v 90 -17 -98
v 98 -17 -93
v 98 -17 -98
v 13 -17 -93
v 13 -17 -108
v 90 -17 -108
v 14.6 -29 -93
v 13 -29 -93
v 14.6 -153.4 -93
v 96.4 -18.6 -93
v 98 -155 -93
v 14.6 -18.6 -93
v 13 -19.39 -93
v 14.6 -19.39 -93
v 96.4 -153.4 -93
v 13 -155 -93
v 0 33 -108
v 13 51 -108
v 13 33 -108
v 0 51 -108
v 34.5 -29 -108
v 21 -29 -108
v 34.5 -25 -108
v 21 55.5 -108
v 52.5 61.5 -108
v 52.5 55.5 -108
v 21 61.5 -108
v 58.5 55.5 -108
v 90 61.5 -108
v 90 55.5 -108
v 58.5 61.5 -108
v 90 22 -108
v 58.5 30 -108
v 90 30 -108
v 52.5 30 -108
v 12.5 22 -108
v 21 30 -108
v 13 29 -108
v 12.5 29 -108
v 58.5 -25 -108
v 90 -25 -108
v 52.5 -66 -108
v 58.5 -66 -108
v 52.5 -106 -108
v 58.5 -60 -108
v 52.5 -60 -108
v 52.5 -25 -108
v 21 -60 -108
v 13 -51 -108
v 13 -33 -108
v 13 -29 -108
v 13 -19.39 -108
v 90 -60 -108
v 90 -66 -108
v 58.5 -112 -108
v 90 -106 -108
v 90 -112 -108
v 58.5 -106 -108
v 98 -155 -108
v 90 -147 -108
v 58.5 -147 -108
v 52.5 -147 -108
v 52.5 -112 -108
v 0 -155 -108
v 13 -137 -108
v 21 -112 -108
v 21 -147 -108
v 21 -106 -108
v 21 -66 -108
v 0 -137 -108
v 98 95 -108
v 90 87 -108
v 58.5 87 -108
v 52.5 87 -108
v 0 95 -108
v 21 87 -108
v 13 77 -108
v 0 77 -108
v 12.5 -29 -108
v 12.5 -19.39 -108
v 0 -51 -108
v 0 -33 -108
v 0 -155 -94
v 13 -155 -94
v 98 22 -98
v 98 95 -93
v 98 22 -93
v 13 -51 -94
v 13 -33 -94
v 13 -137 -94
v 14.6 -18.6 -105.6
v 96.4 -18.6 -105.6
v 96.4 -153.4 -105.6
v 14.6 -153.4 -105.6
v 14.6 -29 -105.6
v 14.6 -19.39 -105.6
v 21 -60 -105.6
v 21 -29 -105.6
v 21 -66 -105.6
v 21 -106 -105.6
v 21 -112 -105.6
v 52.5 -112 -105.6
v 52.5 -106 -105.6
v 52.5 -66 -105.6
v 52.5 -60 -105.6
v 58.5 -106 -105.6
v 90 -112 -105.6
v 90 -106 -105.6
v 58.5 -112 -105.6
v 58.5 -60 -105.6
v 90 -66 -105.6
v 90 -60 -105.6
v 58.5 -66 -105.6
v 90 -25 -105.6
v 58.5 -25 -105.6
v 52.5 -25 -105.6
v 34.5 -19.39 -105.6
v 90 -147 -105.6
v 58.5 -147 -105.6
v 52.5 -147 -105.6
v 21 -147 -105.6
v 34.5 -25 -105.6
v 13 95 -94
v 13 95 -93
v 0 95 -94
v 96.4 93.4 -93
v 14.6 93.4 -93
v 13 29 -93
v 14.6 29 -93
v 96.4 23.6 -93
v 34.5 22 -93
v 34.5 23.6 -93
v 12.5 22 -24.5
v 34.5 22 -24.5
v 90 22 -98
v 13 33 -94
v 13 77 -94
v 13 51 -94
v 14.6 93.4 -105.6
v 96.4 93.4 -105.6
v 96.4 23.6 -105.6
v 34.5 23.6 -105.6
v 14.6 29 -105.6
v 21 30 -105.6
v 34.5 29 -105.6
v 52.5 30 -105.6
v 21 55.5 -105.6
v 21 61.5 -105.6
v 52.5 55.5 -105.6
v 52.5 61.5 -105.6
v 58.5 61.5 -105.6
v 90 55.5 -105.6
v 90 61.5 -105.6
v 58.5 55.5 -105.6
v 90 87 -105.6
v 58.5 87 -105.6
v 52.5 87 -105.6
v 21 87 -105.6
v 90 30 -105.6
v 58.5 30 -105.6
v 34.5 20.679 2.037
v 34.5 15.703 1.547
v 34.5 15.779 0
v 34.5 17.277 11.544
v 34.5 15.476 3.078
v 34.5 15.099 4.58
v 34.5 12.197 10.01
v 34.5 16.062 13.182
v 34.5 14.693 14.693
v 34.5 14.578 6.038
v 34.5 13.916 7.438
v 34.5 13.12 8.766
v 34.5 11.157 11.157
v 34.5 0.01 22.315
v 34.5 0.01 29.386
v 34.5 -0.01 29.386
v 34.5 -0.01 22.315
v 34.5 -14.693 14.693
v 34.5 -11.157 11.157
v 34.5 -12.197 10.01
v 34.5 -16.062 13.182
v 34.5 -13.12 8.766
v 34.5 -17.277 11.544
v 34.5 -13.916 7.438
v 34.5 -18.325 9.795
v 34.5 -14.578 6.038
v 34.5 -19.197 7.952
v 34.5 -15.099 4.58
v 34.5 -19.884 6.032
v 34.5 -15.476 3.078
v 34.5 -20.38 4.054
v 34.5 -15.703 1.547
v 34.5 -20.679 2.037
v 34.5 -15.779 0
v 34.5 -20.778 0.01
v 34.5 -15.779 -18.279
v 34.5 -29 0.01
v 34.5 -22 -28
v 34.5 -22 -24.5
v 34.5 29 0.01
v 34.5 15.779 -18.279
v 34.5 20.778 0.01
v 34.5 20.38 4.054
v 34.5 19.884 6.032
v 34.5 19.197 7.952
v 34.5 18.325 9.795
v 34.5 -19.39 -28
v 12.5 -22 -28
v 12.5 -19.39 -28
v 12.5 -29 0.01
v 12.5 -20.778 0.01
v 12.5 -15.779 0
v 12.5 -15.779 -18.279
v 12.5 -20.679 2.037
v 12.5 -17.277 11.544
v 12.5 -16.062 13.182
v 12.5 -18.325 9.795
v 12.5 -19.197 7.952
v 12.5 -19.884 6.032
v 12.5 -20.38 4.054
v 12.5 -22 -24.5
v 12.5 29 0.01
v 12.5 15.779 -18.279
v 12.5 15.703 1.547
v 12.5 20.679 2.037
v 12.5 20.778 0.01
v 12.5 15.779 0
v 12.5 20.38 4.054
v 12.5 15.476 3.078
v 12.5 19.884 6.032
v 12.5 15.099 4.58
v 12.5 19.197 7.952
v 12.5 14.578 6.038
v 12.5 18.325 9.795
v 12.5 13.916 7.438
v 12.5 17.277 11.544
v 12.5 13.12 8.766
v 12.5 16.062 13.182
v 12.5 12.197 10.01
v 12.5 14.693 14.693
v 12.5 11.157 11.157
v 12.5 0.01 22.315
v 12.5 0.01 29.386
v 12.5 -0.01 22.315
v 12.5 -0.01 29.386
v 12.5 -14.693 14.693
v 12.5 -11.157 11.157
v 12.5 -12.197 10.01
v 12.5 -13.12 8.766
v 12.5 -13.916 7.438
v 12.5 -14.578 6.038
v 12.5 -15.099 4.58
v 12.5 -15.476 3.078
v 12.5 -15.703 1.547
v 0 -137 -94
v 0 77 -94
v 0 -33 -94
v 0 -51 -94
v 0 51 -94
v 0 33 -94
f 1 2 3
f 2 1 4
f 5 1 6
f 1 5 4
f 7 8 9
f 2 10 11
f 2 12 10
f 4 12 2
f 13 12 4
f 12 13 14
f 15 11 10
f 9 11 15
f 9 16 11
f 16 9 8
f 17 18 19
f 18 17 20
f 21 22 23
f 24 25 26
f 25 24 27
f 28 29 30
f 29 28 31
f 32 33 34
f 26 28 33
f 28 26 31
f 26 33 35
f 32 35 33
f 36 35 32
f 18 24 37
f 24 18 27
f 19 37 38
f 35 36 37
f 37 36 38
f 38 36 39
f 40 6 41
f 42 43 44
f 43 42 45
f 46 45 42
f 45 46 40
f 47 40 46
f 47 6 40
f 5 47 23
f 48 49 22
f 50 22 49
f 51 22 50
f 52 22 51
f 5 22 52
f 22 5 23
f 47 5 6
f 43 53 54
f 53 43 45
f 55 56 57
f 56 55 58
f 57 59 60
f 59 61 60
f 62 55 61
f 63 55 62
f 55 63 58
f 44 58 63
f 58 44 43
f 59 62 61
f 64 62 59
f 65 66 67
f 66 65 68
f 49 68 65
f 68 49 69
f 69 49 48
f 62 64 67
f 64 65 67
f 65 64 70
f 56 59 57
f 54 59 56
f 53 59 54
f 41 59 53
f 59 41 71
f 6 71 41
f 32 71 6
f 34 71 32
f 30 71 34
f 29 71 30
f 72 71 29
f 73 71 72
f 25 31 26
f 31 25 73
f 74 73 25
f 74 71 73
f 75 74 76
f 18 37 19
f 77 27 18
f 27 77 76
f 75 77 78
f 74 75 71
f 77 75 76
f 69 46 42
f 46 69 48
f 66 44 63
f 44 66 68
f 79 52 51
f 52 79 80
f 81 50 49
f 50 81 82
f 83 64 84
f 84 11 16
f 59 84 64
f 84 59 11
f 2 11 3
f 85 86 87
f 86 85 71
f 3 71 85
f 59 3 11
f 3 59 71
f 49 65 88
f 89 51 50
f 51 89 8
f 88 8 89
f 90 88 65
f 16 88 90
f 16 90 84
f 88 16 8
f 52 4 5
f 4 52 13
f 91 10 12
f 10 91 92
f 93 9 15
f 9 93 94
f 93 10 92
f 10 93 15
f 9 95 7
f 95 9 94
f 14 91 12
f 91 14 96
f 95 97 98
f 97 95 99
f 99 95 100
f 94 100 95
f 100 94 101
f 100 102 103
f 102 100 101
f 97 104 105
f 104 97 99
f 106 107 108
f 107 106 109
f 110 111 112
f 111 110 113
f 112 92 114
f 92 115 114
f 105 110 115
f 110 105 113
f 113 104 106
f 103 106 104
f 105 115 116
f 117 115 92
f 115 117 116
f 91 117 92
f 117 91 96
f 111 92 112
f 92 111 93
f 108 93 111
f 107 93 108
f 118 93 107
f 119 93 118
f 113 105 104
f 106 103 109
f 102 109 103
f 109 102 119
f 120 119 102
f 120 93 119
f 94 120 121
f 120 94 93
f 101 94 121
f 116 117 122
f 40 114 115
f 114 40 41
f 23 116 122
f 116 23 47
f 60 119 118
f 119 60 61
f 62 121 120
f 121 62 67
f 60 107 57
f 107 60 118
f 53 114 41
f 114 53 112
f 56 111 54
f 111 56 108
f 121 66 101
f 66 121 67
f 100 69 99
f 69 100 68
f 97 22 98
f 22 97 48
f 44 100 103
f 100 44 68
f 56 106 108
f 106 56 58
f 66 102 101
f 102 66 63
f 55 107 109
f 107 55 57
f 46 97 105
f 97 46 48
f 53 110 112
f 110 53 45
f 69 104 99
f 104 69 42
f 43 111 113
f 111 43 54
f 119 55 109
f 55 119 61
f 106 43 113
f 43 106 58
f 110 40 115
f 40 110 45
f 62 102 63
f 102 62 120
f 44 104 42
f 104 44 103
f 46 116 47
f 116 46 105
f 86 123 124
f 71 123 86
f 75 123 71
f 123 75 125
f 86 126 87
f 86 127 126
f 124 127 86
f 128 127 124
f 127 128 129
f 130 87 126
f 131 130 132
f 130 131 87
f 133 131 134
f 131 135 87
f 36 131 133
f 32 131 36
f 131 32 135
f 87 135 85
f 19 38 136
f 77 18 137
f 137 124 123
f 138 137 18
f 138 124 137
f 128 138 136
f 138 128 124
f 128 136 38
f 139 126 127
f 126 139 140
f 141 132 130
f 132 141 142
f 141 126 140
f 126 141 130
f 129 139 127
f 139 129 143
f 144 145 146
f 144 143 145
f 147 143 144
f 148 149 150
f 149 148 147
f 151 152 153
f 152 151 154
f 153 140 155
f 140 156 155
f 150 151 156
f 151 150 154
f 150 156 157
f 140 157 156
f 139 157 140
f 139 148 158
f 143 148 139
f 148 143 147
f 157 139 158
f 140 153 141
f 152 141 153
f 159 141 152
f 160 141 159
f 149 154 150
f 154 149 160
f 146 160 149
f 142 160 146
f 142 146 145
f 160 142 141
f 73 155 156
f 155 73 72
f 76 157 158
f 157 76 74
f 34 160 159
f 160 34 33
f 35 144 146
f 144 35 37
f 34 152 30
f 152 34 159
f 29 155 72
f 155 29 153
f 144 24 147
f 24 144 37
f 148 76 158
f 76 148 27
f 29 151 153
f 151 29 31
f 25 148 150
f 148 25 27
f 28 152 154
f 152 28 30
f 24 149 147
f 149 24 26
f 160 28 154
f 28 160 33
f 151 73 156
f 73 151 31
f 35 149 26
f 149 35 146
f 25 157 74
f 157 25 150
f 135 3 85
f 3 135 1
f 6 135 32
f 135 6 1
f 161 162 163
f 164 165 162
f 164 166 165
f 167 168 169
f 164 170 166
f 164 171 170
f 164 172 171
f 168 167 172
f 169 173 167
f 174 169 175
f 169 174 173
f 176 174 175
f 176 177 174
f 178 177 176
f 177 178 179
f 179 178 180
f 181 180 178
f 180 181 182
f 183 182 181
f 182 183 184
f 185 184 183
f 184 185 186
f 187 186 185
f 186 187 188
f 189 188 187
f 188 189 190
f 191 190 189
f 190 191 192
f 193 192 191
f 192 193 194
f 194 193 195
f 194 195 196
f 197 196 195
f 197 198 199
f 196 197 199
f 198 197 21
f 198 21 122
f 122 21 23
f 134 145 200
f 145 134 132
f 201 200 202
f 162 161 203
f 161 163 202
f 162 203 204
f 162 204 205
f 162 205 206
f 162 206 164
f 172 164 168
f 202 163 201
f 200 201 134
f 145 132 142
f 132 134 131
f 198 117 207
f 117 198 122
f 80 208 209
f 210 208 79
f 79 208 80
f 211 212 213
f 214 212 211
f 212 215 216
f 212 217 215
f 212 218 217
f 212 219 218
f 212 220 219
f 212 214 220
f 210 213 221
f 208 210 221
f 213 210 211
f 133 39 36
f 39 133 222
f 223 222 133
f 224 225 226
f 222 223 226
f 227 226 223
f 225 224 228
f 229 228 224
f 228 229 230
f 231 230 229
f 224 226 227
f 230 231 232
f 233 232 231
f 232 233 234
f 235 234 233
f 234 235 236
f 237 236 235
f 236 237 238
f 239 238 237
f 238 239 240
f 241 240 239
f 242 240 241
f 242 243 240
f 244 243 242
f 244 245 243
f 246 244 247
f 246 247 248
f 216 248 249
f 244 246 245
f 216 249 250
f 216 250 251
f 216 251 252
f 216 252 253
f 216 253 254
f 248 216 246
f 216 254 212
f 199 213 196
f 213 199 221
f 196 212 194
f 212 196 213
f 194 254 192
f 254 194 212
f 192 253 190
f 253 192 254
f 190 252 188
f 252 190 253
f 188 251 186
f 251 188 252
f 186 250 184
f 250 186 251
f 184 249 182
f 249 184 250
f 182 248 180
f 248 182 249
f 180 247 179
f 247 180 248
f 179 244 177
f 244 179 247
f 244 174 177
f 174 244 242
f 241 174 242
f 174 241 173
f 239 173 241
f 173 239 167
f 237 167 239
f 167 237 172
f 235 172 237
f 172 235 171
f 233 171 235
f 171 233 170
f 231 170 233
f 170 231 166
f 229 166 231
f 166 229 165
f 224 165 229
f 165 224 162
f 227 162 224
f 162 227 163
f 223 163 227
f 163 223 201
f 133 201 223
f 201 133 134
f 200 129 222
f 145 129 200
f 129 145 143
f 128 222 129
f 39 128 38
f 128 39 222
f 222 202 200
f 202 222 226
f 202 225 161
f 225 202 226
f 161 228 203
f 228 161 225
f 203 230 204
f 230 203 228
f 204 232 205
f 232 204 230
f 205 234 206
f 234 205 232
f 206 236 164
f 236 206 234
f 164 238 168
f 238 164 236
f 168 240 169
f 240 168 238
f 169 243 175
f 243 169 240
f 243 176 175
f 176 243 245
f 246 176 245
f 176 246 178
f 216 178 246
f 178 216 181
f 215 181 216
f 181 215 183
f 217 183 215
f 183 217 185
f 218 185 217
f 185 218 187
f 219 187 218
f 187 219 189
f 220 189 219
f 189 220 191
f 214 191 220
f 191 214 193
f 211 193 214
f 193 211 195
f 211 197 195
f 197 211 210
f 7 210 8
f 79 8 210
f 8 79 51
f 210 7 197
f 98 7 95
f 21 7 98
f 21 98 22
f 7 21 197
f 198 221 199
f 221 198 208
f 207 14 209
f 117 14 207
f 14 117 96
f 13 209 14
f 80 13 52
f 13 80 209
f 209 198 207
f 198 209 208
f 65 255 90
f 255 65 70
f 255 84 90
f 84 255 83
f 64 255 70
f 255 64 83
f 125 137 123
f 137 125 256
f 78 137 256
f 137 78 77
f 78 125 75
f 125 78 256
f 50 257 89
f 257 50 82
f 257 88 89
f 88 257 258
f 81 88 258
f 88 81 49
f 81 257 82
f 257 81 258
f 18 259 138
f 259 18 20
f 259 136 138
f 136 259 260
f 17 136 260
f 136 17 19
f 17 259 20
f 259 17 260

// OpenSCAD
// =====================================================================
//  PORTASHAMPOO PER RACCORDO DOCCINO  —  v3 (29/10/2026)
//  Parametrico: modifica le misure qui sotto e riesporta lo STL
//  (OpenSCAD: F6 = render, poi File > Export > STL).
//
//  Sistema di riferimento (stando nella doccia, guardando la parete):
//    X = orizzontale lungo il muro (+ verso l'angolo a destra)
//    Y = uscente dal muro verso di te (muro a Y = 0)
//    Z = verticale; l'asse del raccordo è a X = 0, Z = 0
//
//  Novità v2: sotto al raccordo pendono DUE flessibili (attacco vicino alla
//  rosetta + tubo che risale nel porta-doccino), il doccino sta in piedi sulla
//  punta. Il box lascia libero il centro e si cala dall'alto SENZA togliere
//  il doccino.
//
//  Novità v3 (dopo la prova del prototipo veloce):
//   - vano sinistro più grande di 5 mm per lato (largo +10, profondo +10)
//   - piedini posteriori 3 mm più lunghi verso le piastrelle
//   - lato destro più largo di 16 mm: arriva alla parete laterale
//   - DISTANZIATORE in basso davanti: i due vani non si avvicinano più
//     e l'arco non si flette (vedi simulazione nel LEGGIMI)
//   - "stampa_..." = pezzo già ruotato di 90° per entrare nel piatto
// =====================================================================

// ---------- QUALE PEZZO GENERARE ----------
// "stampa_rapido"   = prototipo veloce v3, GIÀ RUOTATO per il piatto (da usare in Cura)
// "stampa_bisaccia" = versione completa v3, GIÀ RUOTATA per il piatto (da usare in Cura)
// "rapido" / "bisaccia" = stessi pezzi orientati come in doccia (per guardarli)
// "scena_rapido" / "scena_bisaccia" = anteprima con muri, raccordo, flessibili e doccino
design = "stampa_rapido";

// ---------- MISURE DEL BAGNO ----------
tubo_d        = 96 / PI; // corpo del raccordo: circonferenza 96 mm -> Ø 30,6 (correggi dopo il provino)
rosetta_d     = 60;      // diametro rosetta (stima)
rosetta_sp    = 11;      // spessore rosetta dal muro (v3: dalla prova i piedini restavano a 3 mm dal muro)
// misure prese dalla faccia della rosetta, lungo il raccordo:
att_da        = 16;      // 1° tubo (attacco acqua, sotto al raccordo): da 16 ...
att_a         = 26;      // ... a 26 mm
doc_da        = 52;      // 2° tubo (flessibile che entra nel porta-doccino): da 52 ...
doc_a         = 66;      // ... a 66 mm
tubo_fine     = 72;      // fine del raccordo dalla rosetta (stima)
doccino_d     = 24;      // diametro del doccino (stima)
angolo_x      = 96;      // asse raccordo -> parete laterale destra (v3: dalla prova mancavano 16 mm)
miscelatore_x = -188;    // bordo del miscelatore a sinistra (stima da scan)

// ---------- GANCIO ----------
gioco         = 0.5;     // gioco radiale tra gancio e raccordo
anello_y0     = rosetta_sp + 1.5;   // il gancio parte subito davanti alla rosetta
anello_l      = 22;      // lunghezza del gancio sopra al raccordo (resta prima del doccino)
anello_sp     = 5;       // spessore radiale del gancio
avvolgimento  = 180;     // gradi di avvolgimento sopra al raccordo (180 = arco fino a metà raccordo)
arco_goccia   = true;    // arco a goccia: stampabile in piedi senza supporti

// ---------- BOX ----------
parete        = 2.4;     // pareti (6 perimetri da 0,4)
fondo         = 2.4;
box_y0        = rosetta_sp + 2;  // faccia posteriore del box (davanti alla rosetta)
box_prof      = 85;      // profondità esterna (v3: +10)
box_top       = -28;     // bordo posteriore (sotto al raccordo)
box_h         = 80;      // altezza sul retro
box_calo      = 25;      // il bordo anteriore è più basso di così
box_sx        = -155;    // estremo sinistro (v3: vano sinistro +5 mm a sinistra)
varco         = 22;      // varco centrale: lato destro a 22 mm dall'asse
varco_sx      = 17;      // lato sinistro a 17 mm (v3: vano sinistro +5 mm verso il centro)
// distanziatore tra i due vani, in basso davanti a flessibili e doccino
dist_h        = 10;      // altezza
dist_p        = 8;       // profondità
asola_l       = 4;       // asole di scarico nel fondo
asola_passo   = 10;
piede_l       = 18;      // piedini che appoggiano sulle piastrelle
piede_h       = 14;

$fn = 64;

// ---------- valori derivati ----------
R      = tubo_d / 2;
ri     = R + gioco;
ro     = ri + anello_sp;
ay1    = anello_y0 + anello_l;
zb     = box_top - box_h;
by1    = box_y0 + box_prof;
box_dx = angolo_x - 1;               // 1 mm dalla parete laterale
piede_in = rosetta_d / 2 + 3;        // piedini interni fuori dalla rosetta (montaggio dall'alto)
y_att  = rosetta_sp + (att_da + att_a) / 2;
y_doc  = rosetta_sp + (doc_da + doc_a) / 2;

// =====================================================================
//  GANCIO: arco sopra al raccordo + due montanti verso il box
// =====================================================================
// profilo "a goccia": sopra al raccordo le superfici non superano i 45° di sbalzo,
// così l'arco si stampa in piedi SENZA supporti e senza colature dove appoggia.
module goccia(r) {
    if (arco_goccia) hull() { circle(r = r); translate([0, r * sqrt(2) - 0.01]) square(0.02, center = true); }
    else circle(r = r);
}
module profilo_anello() {
    big = ro * 3;
    difference() {
        goccia(ro);
        goccia(ri);
        polygon(concat([[0, 0]],
            [for (a = [avvolgimento / 2 : 5 : 360 - avvolgimento / 2]) [big * sin(a), big * cos(a)]],
            [[big * sin(360 - avvolgimento / 2), big * cos(360 - avvolgimento / 2)]]));
    }
}

// montante: accanto al raccordo sta fuori dal tubo (x >= ri), sotto si sposta fino a x_in
// con uno smusso a 45° (nessun gradino orizzontale sospeso)
module profilo_montante(lato, z_fine, x_in) {
    xo = max(ro + 2, x_in + 7);
    zs = -R - 3;                    // sotto questa quota il montante può rientrare verso il centro
    mirror([lato < 0 ? 1 : 0, 0])
    polygon([[x_in, z_fine], [xo, z_fine], [xo, 0.01], [ri, 0.01], [ri, zs], [x_in, zs - (x_in - ri)]]);
}

module gancio(z_sx, z_dx, x_in_sx, x_in_dx) {
    translate([0, ay1, 0]) rotate([90, 0, 0])
    linear_extrude(anello_l)
    union() {
        profilo_anello();
        profilo_montante(-1, z_sx, x_in_sx);
        profilo_montante( 1, z_dx, x_in_dx);
    }
}

// =====================================================================
//  VANO: scatola aperta, bordo anteriore ribassato, fondo con asole
// =====================================================================
module taglio_bordo(x0, x1) {
    ang = atan(box_calo / (by1 - box_y0));
    translate([x0 - 1, box_y0, box_top]) rotate([-ang, 0, 0])
        translate([0, -50, 0]) cube([x1 - x0 + 2, 300, 200]);
}

module asole(x0, x1, y0, y1) {
    for (x = [x0 + parete + 5 : asola_passo : x1 - parete - 5])
        translate([x, y0 + parete + 6, zb - 1]) cube([asola_l, y1 - y0 - 2 * parete - 12, fondo + 2]);
}

module vano(x0, x1) {
    difference() {
        translate([x0, box_y0, zb]) cube([x1 - x0, by1 - box_y0, box_h]);
        translate([x0 + parete, box_y0 + parete, zb + fondo])
            cube([x1 - x0 - 2 * parete, by1 - box_y0 - 2 * parete, box_h]);
        taglio_bordo(x0, x1);
        asole(x0, x1, box_y0, by1);
    }
}

// versione "telaio" per la prova veloce: cornice + traversine + bordino basso
lab_h = 15;     // altezza del bordino
lab_s = 1.6;    // spessore del bordino
module vano_rapido(x0, x1) {
    union() {
        difference() {   // bordino perimetrale
            translate([x0, box_y0, zb]) cube([x1 - x0, by1 - box_y0, lab_h]);
            translate([x0 + lab_s, box_y0 + lab_s, zb - 1]) cube([x1 - x0 - 2 * lab_s, by1 - box_y0 - 2 * lab_s, lab_h + 2]);
        }
        difference() {   // cornice del fondo
            translate([x0, box_y0, zb]) cube([x1 - x0, by1 - box_y0, fondo]);
            translate([x0 + 8, box_y0 + 8, zb - 1]) cube([x1 - x0 - 16, by1 - box_y0 - 16, fondo + 2]);
        }
        // traversine (i flaconi ci appoggiano sopra)
        n = max(1, floor((x1 - x0) / 35));
        if (n > 1) for (i = [1 : n - 1]) translate([x0 + i * (x1 - x0) / n - 3, box_y0, zb]) cube([6, by1 - box_y0, fondo]);
        translate([x0, (box_y0 + by1) / 2 - 3, zb]) cube([x1 - x0, 6, fondo]);
    }
}

module piede(x0) {
    translate([x0, 0, zb]) cube([piede_l, box_y0 + 1, piede_h]);
}

// =====================================================================
//  BISACCIA v3
// =====================================================================
module distanziatore() {
    translate([-varco_sx - 1, by1 - dist_p, zb]) cube([varco_sx + varco + 2, dist_p, dist_h]);
}

module bisaccia(rapido = false) {
    union() {
        if (rapido) { vano_rapido(box_sx, -varco_sx); vano_rapido(varco, box_dx); }
        else        { vano(box_sx, -varco_sx);        vano(varco, box_dx); }
        distanziatore();
        gancio(zb, zb, varco, varco);
        // riempie la fessura tra montante sinistro e parete interna del vano sinistro
        translate([-varco - 0.01, anello_y0, zb]) cube([varco - varco_sx - parete + 0.02, anello_l, box_top - zb]);
        piede(box_sx);
        piede(box_dx - piede_l);
        piede(-piede_in - piede_l);
        piede(piede_in);
    }
}

// =====================================================================
//  SCENA DI ANTEPRIMA (non stampare)
// =====================================================================
module ambiente() {
    color([0.25, 0.25, 0.27]) translate([-260, -6, -220]) cube([260 + angolo_x, 6, 420]);       // muro
    color([0.30, 0.30, 0.32]) translate([angolo_x, -6, -220]) cube([6, 260, 420]);              // parete laterale
    color("silver") rotate([-90, 0, 0]) cylinder(d = rosetta_d, h = rosetta_sp);               // rosetta
    color("silver") rotate([-90, 0, 0]) cylinder(d = tubo_d, h = rosetta_sp + tubo_fine);      // raccordo
    color([0.75, 0.75, 0.78]) translate([0, y_att, -R + 2]) mirror([0, 0, 1])                   // 1° flessibile
        cylinder(d = att_a - att_da, h = 220);
    color([0.75, 0.75, 0.78]) translate([0, y_doc, -R + 2]) mirror([0, 0, 1])                   // 2° flessibile
        cylinder(d = doc_a - doc_da, h = 220);
    color("silver") translate([0, y_doc, R - 4]) cylinder(d = doccino_d, h = 165);             // doccino in piedi
    color([0.8, 0.8, 0.85, 0.5]) translate([miscelatore_x - 50, 0, -100]) cube([50, 45, 140]); // miscelatore
}

module flaconi_demo(xs, ds) {
    for (i = [0 : len(xs) - 1]) color([0.2, 0.55, 0.85])
        translate([xs[i], (box_y0 + by1) / 2 + 3, zb + fondo]) cylinder(d = ds[i], h = 190);
}

// =====================================================================
// Il mirror porta il pezzo nel sistema di OpenSCAD: con la vista "Front"
// lo vedi come dalla doccia (angolo a destra, miscelatore a sinistra).
// "stampa_...": ruotato di 90° (lato lungo lungo Y) per stare nel piatto da 255 mm.
module orientato() { mirror([0, 1, 0]) children(); }
if (design == "stampa_rapido")   rotate([0, 0, 90]) orientato() bisaccia(true);
if (design == "stampa_bisaccia") rotate([0, 0, 90]) orientato() bisaccia();
orientato() {
    if (design == "rapido")   bisaccia(true);
    if (design == "bisaccia") bisaccia();
    if (design == "ambiente") ambiente();
    if (design == "scena_rapido")   { ambiente(); color("orange") bisaccia(true); flaconi_demo([-120, -55, 58], [65, 65, 62]); }
    if (design == "scena_bisaccia") { ambiente(); color("orange") bisaccia();     flaconi_demo([-120, -55, 58], [65, 65, 62]); }
}
